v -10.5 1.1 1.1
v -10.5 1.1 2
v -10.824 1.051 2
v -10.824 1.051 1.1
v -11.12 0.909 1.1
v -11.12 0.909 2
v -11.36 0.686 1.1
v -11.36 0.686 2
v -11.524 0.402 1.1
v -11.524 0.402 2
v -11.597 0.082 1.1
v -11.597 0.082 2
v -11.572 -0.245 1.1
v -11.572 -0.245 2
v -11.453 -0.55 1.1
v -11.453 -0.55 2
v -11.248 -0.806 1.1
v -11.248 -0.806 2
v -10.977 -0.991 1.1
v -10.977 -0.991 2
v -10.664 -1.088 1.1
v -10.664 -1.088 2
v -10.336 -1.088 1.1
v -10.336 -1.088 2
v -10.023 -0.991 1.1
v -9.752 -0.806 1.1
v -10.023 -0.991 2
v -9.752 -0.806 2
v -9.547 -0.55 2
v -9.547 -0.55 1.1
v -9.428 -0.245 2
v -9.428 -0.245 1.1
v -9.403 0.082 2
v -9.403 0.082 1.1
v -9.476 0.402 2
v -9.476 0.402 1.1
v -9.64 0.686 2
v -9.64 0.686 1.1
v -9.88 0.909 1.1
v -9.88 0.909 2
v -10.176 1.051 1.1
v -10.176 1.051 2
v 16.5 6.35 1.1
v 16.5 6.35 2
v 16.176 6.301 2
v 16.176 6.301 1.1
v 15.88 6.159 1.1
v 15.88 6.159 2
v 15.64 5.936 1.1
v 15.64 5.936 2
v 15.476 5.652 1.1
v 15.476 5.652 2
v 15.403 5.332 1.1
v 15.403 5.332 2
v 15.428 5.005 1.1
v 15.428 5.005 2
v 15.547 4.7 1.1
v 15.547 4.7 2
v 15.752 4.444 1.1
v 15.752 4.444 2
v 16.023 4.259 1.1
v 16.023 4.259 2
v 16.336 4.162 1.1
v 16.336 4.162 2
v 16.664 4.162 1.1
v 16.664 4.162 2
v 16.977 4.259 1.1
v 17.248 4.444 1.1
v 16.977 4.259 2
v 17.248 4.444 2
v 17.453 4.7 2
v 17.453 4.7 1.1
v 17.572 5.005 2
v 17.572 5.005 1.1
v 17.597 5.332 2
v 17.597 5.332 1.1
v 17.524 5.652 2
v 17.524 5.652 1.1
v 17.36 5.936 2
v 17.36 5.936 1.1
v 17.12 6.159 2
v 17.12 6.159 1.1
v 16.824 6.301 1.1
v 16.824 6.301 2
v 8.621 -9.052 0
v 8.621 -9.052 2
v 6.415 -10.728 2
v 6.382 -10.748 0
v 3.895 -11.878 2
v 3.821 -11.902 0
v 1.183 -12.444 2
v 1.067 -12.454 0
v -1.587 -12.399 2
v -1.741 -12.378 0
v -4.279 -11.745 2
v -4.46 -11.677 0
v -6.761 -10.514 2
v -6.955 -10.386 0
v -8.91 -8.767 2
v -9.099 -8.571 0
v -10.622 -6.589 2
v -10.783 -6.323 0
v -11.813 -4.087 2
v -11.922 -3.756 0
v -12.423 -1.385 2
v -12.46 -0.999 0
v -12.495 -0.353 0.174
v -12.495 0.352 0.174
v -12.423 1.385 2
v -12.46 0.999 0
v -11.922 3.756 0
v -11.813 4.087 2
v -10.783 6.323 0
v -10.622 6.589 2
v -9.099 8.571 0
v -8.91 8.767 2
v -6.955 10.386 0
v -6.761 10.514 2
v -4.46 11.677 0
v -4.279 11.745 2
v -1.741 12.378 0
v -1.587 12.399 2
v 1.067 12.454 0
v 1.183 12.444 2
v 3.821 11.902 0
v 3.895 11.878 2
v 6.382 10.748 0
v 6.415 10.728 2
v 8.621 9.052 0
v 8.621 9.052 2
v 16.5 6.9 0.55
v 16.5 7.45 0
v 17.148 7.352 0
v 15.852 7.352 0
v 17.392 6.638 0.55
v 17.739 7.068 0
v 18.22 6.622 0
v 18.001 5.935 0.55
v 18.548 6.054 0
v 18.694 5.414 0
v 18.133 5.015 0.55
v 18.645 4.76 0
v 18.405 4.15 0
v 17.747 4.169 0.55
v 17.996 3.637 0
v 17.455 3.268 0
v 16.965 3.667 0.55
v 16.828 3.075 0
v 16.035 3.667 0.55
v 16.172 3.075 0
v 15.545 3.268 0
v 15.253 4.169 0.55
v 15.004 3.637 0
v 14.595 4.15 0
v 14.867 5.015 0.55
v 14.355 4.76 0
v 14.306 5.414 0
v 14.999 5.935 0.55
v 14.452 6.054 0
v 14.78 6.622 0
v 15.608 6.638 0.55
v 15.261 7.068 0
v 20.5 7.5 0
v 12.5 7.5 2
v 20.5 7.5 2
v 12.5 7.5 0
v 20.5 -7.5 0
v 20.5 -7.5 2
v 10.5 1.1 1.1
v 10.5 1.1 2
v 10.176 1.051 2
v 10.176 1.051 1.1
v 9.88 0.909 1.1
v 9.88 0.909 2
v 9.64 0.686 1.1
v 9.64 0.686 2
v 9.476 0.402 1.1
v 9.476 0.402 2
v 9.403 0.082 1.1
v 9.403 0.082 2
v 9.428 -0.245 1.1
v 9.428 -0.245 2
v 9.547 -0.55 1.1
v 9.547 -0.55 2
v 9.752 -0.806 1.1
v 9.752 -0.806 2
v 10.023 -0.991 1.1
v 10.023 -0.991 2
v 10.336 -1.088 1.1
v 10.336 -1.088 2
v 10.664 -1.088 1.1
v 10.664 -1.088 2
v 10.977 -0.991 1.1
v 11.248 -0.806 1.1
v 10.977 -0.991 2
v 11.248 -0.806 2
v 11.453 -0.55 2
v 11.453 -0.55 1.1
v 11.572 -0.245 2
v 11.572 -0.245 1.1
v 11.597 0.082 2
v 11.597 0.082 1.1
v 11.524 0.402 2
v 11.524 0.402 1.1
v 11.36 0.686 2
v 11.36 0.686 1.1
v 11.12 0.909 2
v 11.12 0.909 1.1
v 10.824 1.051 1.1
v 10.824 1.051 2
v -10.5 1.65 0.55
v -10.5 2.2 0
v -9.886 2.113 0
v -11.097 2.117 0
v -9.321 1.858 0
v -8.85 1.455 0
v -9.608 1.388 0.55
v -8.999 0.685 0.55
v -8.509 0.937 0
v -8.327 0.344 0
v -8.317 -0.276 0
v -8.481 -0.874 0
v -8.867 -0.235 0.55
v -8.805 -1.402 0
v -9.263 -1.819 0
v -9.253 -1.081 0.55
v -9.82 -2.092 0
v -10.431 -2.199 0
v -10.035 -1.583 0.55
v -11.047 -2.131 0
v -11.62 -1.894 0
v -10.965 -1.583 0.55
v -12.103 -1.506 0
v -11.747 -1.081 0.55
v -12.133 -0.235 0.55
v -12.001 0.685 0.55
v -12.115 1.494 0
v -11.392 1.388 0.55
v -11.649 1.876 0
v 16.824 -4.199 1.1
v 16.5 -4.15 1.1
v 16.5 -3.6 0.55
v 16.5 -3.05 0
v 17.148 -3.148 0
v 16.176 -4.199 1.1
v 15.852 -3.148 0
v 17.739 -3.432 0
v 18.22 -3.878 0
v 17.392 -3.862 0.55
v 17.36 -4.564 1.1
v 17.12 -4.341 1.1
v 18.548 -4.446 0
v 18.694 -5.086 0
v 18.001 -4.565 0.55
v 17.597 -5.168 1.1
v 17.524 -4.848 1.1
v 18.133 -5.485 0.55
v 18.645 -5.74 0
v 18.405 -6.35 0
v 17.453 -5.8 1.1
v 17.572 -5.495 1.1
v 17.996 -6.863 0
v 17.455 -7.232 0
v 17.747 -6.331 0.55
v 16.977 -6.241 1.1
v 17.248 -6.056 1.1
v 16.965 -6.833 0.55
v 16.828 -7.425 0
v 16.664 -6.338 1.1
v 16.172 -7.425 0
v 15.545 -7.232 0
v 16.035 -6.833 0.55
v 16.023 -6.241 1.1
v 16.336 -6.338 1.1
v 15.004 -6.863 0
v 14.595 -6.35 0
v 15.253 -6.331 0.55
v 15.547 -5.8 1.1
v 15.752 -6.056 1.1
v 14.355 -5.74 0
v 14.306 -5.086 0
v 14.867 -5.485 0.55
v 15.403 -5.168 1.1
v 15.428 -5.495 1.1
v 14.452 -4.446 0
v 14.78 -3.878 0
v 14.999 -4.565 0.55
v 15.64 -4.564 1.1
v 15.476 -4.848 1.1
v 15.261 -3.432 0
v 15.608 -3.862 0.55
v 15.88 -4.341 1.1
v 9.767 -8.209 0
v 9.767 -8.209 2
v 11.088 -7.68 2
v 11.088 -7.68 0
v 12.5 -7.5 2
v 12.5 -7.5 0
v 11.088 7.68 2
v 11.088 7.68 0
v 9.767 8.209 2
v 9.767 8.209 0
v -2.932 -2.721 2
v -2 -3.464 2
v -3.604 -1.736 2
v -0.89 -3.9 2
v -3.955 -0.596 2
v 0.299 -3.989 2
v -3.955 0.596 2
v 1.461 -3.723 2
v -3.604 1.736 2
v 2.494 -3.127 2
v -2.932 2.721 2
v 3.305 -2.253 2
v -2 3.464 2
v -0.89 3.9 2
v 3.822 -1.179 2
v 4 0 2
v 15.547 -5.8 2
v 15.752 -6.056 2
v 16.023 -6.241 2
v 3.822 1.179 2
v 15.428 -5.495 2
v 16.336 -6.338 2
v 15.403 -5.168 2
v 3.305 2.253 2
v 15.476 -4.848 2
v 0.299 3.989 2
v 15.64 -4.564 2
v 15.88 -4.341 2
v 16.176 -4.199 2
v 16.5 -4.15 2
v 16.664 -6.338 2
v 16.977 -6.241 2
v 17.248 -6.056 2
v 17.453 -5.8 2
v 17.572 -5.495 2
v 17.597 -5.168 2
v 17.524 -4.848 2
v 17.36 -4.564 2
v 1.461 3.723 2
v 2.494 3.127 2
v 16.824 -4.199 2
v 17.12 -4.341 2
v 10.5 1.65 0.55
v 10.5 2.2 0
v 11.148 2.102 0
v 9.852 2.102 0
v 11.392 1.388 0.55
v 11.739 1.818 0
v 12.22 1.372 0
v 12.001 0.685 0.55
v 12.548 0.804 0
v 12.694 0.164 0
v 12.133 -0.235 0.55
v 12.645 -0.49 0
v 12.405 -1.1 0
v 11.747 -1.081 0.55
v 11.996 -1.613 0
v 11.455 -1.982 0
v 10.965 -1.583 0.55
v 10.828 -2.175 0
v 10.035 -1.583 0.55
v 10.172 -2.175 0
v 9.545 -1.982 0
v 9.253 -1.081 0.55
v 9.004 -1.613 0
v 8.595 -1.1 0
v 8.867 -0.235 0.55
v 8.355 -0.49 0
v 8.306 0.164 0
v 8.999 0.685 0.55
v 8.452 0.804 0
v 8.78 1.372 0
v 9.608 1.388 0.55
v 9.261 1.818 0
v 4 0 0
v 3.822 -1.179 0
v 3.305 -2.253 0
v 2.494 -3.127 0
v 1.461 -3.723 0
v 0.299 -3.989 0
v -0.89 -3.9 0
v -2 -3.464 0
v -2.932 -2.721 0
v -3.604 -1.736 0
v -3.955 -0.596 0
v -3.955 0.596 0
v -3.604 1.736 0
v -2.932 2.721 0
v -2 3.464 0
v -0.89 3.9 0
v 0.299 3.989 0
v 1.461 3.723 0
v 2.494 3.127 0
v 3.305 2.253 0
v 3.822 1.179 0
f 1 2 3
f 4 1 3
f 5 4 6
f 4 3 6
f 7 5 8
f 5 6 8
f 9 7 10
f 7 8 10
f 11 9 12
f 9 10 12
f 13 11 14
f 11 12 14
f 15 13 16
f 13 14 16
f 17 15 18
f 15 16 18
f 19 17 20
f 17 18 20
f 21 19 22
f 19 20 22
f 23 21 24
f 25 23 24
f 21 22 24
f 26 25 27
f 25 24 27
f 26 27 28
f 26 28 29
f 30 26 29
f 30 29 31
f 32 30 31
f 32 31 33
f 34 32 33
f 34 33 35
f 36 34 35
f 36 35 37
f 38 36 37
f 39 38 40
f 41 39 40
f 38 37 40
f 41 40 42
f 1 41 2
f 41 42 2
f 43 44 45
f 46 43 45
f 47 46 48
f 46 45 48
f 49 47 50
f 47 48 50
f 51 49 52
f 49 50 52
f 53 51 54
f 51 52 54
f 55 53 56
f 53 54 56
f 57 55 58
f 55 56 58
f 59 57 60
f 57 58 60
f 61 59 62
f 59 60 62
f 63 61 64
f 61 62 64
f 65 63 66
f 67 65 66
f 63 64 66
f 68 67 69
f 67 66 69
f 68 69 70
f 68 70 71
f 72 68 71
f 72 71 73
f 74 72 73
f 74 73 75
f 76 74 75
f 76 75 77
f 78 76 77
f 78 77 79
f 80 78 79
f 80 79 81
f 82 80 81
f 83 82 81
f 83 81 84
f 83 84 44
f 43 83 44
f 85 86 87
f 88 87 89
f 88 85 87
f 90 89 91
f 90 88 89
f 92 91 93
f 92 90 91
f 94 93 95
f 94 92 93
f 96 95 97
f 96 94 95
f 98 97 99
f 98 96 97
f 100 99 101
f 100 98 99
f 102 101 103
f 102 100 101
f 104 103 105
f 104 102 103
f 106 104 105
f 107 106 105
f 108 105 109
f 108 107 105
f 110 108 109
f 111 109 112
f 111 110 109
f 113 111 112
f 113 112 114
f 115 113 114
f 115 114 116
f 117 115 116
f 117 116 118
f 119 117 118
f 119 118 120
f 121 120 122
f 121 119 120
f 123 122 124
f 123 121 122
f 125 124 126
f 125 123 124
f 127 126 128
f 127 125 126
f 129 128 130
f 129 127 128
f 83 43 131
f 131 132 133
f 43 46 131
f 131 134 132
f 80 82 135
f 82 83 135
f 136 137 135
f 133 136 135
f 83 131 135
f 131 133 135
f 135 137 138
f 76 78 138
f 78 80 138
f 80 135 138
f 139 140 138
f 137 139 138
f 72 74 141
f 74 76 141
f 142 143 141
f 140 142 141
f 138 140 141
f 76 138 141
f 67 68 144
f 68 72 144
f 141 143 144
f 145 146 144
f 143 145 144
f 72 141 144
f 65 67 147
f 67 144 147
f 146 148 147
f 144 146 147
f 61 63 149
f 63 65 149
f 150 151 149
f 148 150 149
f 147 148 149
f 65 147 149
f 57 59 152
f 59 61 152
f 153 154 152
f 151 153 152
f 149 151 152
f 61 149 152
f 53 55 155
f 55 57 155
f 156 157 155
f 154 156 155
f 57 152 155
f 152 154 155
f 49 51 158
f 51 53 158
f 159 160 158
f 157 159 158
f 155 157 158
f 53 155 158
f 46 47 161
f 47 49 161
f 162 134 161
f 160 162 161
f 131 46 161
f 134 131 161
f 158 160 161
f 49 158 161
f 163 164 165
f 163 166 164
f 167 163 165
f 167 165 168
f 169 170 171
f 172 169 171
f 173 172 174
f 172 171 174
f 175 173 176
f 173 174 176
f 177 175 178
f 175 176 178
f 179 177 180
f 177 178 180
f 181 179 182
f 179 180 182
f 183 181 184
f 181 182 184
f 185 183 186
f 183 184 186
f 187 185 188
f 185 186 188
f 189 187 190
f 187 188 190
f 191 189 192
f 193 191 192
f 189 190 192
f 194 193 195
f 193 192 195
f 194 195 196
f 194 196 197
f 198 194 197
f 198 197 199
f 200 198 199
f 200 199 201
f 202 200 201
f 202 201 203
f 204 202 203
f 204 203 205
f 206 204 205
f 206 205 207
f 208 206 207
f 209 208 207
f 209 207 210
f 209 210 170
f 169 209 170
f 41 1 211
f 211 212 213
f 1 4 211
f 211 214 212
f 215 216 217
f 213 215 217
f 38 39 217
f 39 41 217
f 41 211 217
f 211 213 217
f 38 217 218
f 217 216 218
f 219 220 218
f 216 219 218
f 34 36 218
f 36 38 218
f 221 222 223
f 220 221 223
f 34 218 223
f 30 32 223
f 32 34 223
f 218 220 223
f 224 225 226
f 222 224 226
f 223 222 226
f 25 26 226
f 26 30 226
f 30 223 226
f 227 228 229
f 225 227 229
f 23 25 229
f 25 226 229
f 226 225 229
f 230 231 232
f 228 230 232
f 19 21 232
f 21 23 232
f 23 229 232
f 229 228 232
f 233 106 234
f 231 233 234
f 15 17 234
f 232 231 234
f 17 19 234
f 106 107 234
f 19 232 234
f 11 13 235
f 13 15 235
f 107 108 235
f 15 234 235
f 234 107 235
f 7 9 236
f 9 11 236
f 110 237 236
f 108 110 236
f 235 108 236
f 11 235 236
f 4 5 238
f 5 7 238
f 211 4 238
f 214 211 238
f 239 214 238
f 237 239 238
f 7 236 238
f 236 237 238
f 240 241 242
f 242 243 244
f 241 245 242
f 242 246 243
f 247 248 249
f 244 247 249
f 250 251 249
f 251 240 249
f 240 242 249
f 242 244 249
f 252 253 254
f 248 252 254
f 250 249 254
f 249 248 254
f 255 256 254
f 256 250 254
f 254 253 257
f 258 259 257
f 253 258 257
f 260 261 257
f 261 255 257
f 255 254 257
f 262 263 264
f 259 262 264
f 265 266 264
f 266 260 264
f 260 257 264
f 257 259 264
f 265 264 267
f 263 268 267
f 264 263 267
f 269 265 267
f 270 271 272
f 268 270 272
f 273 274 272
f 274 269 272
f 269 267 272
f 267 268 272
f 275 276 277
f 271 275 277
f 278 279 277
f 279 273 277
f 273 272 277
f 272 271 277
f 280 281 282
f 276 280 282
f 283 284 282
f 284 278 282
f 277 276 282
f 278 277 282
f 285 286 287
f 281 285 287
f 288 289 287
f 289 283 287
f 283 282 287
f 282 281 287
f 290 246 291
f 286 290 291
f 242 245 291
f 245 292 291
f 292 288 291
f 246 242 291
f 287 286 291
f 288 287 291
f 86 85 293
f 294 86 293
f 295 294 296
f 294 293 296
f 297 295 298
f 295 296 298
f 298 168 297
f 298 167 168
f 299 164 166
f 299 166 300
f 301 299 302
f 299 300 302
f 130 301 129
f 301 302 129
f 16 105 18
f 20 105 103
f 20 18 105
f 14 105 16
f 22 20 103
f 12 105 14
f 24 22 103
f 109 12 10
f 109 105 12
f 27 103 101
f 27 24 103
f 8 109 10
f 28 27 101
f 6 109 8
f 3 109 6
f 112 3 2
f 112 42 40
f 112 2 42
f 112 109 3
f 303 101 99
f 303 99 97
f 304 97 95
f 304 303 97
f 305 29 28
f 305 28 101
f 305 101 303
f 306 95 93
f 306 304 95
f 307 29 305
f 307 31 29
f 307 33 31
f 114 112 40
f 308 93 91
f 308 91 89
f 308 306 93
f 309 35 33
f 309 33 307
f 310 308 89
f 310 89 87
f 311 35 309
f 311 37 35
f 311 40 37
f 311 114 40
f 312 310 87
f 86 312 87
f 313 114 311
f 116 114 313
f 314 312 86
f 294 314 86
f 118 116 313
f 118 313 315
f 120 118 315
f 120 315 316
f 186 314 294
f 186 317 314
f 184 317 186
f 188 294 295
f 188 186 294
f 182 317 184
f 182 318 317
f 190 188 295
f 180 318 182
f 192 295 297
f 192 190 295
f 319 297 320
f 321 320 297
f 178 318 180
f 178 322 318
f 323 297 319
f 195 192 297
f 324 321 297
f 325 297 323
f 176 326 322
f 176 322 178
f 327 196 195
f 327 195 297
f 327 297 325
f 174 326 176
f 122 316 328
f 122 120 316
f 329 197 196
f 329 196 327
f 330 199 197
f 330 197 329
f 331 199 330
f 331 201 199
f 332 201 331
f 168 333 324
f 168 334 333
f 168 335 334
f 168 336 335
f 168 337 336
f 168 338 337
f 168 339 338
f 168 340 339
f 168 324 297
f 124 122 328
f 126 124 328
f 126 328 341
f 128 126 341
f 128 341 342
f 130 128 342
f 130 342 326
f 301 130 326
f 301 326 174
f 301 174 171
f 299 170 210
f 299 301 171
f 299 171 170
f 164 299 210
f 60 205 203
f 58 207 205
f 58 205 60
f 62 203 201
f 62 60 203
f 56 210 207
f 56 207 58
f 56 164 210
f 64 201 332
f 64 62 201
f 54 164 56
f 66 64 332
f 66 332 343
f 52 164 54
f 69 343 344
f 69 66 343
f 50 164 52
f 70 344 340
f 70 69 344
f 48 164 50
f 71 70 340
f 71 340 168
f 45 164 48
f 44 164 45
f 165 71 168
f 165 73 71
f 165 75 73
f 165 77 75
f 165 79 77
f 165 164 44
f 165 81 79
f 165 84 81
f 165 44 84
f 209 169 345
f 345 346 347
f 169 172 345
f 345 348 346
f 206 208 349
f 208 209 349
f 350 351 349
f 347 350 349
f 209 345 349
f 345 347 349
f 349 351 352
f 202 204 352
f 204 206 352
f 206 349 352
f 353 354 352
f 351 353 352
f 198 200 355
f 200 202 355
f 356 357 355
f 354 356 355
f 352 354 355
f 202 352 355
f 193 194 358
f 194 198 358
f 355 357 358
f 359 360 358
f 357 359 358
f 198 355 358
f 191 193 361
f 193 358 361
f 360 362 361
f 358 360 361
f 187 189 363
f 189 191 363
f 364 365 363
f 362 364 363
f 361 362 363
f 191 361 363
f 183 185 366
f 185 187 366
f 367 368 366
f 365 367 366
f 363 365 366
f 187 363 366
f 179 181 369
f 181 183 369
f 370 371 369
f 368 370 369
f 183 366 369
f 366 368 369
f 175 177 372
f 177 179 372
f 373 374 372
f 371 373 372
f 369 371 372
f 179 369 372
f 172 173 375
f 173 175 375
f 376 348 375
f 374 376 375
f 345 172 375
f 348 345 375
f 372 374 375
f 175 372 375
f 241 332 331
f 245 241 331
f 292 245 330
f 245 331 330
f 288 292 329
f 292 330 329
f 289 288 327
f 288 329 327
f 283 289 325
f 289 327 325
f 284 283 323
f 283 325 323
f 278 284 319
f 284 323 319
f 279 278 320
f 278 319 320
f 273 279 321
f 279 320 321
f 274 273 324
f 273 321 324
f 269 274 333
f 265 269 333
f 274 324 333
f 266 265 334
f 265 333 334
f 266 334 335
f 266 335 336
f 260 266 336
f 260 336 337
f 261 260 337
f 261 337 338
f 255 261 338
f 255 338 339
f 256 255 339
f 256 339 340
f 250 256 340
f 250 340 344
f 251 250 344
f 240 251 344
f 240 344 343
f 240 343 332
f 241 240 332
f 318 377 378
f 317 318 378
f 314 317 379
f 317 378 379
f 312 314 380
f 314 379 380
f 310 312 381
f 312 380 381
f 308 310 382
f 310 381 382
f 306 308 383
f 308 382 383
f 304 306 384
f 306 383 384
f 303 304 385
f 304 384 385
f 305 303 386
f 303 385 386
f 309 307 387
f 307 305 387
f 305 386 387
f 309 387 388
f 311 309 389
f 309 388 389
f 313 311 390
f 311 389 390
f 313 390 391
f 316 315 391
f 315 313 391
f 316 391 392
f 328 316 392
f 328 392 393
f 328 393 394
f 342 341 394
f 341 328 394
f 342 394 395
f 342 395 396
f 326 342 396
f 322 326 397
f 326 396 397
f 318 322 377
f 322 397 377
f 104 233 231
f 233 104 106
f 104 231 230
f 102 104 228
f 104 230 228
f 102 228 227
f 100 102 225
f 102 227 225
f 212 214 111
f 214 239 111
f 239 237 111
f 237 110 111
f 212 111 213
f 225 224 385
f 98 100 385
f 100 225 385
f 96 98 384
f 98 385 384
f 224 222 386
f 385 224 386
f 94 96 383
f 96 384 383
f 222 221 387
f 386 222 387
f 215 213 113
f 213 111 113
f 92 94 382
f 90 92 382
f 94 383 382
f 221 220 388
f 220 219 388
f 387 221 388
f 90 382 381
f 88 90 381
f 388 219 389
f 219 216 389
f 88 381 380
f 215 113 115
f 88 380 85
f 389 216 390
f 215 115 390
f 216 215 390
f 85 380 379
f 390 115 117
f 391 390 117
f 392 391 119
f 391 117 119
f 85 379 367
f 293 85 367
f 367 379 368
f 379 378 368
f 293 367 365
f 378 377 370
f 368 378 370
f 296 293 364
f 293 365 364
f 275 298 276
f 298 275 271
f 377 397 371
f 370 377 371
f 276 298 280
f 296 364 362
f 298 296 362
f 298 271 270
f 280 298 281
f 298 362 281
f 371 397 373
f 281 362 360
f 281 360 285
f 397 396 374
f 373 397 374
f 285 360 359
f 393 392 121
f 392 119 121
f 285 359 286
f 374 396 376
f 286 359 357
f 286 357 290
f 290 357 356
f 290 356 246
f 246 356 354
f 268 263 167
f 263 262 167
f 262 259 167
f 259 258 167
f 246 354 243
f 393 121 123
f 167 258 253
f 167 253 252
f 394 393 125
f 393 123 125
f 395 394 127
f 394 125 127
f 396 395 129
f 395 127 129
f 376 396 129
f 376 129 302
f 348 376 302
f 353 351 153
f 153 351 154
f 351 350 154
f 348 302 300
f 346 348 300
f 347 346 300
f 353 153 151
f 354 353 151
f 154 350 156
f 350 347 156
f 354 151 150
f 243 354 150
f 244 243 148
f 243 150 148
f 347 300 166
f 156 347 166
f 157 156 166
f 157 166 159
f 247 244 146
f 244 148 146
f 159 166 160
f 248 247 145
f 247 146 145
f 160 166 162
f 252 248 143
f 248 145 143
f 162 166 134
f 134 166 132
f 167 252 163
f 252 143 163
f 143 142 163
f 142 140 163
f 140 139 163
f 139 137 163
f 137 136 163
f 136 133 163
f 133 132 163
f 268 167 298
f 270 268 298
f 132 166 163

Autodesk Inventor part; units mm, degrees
ref_plane "YZ Plane" through (0, 0, 0) normal (1, 0, 0) x (0, 1, 0)
ref_plane "XZ Plane" through (0, 0, 0) normal (0, 1, 0) x (-1, 0, 0)
ref_plane "XY Plane" through (0, 0, 0) normal (0, 0, 1) x (1, 0, 0)
sketch "Skizze1" plane through (0, 0, 0) normal (0, 0, 1) x (1, 0, 0)
  line L0 (0, 0) -> (20.5, 0) construction
  circle A0 centre (0, 0) radius 4
  arc A1 (8.6207, 9.0517) -> (12.5, 7.5) centre (12.5, 13.125) ccw
  arc A2 (12.5, -7.5) -> (8.6207, -9.0517) centre (12.5, -13.125) ccw
  line L1 (12.5, 7.5) -> (20.5, 7.5)
  line L2 (20.5, 7.5) -> (20.5, -7.5)
  line L3 (20.5, -7.5) -> (12.5, -7.5)
  line L4 (12.5, -7.5) -> (12.5, 7.5) construction
  circle A3 centre (0, 0) radius 10.5 construction
  line L5 (0, 0) -> (-10.5, 0) construction
  line L6 (16.5, 5.25) -> (16.5, -5.25) construction
  line L7 (16.5, 7.5) -> (16.5, -7.5) construction
  circle A4 centre (0, 0) radius 12.5
  point P0 (12.5, 0)
  point P1 (10.5, 0)
  point P2 (16.5, 0)
  dimension "d105" = 8
  dimension "d106" = 15
  dimension "LowerArm_ShaftFixation_Width" = 8
  dimension "d127" = 21
  dimension "d130" = 360
  dimension "d132" = 10.5
  dimension "d150" = 25
extrude "Grundprofil" add sketch "Skizze1" along normal blind 2
hole "Hole10" at (10.5, 0, 0) at (-10.5, 0, 0) direction (0, 0, 1) diameter 2.2 depth 12 tip angle 118 countersink diameter 4.4 countersink angle 90 clearance for "Countersunk Flat Head Screw DIN EN ISO 2009" size "M2" standard "DIN"
hole "Hole11" at (16.5, 5.25, 0) at (16.5, -5.25, 0) direction (0, 0, 1) diameter 2.2 depth 3 tip angle 118 countersink diameter 4.4 countersink angle 90 clearance for "Countersunk Raised Head Screw ISO 2010/7047" size "M2" standard "ISO"
properties part number "LowerArm_JointConnector_Prox_v2" material "Aluminum 6061"
